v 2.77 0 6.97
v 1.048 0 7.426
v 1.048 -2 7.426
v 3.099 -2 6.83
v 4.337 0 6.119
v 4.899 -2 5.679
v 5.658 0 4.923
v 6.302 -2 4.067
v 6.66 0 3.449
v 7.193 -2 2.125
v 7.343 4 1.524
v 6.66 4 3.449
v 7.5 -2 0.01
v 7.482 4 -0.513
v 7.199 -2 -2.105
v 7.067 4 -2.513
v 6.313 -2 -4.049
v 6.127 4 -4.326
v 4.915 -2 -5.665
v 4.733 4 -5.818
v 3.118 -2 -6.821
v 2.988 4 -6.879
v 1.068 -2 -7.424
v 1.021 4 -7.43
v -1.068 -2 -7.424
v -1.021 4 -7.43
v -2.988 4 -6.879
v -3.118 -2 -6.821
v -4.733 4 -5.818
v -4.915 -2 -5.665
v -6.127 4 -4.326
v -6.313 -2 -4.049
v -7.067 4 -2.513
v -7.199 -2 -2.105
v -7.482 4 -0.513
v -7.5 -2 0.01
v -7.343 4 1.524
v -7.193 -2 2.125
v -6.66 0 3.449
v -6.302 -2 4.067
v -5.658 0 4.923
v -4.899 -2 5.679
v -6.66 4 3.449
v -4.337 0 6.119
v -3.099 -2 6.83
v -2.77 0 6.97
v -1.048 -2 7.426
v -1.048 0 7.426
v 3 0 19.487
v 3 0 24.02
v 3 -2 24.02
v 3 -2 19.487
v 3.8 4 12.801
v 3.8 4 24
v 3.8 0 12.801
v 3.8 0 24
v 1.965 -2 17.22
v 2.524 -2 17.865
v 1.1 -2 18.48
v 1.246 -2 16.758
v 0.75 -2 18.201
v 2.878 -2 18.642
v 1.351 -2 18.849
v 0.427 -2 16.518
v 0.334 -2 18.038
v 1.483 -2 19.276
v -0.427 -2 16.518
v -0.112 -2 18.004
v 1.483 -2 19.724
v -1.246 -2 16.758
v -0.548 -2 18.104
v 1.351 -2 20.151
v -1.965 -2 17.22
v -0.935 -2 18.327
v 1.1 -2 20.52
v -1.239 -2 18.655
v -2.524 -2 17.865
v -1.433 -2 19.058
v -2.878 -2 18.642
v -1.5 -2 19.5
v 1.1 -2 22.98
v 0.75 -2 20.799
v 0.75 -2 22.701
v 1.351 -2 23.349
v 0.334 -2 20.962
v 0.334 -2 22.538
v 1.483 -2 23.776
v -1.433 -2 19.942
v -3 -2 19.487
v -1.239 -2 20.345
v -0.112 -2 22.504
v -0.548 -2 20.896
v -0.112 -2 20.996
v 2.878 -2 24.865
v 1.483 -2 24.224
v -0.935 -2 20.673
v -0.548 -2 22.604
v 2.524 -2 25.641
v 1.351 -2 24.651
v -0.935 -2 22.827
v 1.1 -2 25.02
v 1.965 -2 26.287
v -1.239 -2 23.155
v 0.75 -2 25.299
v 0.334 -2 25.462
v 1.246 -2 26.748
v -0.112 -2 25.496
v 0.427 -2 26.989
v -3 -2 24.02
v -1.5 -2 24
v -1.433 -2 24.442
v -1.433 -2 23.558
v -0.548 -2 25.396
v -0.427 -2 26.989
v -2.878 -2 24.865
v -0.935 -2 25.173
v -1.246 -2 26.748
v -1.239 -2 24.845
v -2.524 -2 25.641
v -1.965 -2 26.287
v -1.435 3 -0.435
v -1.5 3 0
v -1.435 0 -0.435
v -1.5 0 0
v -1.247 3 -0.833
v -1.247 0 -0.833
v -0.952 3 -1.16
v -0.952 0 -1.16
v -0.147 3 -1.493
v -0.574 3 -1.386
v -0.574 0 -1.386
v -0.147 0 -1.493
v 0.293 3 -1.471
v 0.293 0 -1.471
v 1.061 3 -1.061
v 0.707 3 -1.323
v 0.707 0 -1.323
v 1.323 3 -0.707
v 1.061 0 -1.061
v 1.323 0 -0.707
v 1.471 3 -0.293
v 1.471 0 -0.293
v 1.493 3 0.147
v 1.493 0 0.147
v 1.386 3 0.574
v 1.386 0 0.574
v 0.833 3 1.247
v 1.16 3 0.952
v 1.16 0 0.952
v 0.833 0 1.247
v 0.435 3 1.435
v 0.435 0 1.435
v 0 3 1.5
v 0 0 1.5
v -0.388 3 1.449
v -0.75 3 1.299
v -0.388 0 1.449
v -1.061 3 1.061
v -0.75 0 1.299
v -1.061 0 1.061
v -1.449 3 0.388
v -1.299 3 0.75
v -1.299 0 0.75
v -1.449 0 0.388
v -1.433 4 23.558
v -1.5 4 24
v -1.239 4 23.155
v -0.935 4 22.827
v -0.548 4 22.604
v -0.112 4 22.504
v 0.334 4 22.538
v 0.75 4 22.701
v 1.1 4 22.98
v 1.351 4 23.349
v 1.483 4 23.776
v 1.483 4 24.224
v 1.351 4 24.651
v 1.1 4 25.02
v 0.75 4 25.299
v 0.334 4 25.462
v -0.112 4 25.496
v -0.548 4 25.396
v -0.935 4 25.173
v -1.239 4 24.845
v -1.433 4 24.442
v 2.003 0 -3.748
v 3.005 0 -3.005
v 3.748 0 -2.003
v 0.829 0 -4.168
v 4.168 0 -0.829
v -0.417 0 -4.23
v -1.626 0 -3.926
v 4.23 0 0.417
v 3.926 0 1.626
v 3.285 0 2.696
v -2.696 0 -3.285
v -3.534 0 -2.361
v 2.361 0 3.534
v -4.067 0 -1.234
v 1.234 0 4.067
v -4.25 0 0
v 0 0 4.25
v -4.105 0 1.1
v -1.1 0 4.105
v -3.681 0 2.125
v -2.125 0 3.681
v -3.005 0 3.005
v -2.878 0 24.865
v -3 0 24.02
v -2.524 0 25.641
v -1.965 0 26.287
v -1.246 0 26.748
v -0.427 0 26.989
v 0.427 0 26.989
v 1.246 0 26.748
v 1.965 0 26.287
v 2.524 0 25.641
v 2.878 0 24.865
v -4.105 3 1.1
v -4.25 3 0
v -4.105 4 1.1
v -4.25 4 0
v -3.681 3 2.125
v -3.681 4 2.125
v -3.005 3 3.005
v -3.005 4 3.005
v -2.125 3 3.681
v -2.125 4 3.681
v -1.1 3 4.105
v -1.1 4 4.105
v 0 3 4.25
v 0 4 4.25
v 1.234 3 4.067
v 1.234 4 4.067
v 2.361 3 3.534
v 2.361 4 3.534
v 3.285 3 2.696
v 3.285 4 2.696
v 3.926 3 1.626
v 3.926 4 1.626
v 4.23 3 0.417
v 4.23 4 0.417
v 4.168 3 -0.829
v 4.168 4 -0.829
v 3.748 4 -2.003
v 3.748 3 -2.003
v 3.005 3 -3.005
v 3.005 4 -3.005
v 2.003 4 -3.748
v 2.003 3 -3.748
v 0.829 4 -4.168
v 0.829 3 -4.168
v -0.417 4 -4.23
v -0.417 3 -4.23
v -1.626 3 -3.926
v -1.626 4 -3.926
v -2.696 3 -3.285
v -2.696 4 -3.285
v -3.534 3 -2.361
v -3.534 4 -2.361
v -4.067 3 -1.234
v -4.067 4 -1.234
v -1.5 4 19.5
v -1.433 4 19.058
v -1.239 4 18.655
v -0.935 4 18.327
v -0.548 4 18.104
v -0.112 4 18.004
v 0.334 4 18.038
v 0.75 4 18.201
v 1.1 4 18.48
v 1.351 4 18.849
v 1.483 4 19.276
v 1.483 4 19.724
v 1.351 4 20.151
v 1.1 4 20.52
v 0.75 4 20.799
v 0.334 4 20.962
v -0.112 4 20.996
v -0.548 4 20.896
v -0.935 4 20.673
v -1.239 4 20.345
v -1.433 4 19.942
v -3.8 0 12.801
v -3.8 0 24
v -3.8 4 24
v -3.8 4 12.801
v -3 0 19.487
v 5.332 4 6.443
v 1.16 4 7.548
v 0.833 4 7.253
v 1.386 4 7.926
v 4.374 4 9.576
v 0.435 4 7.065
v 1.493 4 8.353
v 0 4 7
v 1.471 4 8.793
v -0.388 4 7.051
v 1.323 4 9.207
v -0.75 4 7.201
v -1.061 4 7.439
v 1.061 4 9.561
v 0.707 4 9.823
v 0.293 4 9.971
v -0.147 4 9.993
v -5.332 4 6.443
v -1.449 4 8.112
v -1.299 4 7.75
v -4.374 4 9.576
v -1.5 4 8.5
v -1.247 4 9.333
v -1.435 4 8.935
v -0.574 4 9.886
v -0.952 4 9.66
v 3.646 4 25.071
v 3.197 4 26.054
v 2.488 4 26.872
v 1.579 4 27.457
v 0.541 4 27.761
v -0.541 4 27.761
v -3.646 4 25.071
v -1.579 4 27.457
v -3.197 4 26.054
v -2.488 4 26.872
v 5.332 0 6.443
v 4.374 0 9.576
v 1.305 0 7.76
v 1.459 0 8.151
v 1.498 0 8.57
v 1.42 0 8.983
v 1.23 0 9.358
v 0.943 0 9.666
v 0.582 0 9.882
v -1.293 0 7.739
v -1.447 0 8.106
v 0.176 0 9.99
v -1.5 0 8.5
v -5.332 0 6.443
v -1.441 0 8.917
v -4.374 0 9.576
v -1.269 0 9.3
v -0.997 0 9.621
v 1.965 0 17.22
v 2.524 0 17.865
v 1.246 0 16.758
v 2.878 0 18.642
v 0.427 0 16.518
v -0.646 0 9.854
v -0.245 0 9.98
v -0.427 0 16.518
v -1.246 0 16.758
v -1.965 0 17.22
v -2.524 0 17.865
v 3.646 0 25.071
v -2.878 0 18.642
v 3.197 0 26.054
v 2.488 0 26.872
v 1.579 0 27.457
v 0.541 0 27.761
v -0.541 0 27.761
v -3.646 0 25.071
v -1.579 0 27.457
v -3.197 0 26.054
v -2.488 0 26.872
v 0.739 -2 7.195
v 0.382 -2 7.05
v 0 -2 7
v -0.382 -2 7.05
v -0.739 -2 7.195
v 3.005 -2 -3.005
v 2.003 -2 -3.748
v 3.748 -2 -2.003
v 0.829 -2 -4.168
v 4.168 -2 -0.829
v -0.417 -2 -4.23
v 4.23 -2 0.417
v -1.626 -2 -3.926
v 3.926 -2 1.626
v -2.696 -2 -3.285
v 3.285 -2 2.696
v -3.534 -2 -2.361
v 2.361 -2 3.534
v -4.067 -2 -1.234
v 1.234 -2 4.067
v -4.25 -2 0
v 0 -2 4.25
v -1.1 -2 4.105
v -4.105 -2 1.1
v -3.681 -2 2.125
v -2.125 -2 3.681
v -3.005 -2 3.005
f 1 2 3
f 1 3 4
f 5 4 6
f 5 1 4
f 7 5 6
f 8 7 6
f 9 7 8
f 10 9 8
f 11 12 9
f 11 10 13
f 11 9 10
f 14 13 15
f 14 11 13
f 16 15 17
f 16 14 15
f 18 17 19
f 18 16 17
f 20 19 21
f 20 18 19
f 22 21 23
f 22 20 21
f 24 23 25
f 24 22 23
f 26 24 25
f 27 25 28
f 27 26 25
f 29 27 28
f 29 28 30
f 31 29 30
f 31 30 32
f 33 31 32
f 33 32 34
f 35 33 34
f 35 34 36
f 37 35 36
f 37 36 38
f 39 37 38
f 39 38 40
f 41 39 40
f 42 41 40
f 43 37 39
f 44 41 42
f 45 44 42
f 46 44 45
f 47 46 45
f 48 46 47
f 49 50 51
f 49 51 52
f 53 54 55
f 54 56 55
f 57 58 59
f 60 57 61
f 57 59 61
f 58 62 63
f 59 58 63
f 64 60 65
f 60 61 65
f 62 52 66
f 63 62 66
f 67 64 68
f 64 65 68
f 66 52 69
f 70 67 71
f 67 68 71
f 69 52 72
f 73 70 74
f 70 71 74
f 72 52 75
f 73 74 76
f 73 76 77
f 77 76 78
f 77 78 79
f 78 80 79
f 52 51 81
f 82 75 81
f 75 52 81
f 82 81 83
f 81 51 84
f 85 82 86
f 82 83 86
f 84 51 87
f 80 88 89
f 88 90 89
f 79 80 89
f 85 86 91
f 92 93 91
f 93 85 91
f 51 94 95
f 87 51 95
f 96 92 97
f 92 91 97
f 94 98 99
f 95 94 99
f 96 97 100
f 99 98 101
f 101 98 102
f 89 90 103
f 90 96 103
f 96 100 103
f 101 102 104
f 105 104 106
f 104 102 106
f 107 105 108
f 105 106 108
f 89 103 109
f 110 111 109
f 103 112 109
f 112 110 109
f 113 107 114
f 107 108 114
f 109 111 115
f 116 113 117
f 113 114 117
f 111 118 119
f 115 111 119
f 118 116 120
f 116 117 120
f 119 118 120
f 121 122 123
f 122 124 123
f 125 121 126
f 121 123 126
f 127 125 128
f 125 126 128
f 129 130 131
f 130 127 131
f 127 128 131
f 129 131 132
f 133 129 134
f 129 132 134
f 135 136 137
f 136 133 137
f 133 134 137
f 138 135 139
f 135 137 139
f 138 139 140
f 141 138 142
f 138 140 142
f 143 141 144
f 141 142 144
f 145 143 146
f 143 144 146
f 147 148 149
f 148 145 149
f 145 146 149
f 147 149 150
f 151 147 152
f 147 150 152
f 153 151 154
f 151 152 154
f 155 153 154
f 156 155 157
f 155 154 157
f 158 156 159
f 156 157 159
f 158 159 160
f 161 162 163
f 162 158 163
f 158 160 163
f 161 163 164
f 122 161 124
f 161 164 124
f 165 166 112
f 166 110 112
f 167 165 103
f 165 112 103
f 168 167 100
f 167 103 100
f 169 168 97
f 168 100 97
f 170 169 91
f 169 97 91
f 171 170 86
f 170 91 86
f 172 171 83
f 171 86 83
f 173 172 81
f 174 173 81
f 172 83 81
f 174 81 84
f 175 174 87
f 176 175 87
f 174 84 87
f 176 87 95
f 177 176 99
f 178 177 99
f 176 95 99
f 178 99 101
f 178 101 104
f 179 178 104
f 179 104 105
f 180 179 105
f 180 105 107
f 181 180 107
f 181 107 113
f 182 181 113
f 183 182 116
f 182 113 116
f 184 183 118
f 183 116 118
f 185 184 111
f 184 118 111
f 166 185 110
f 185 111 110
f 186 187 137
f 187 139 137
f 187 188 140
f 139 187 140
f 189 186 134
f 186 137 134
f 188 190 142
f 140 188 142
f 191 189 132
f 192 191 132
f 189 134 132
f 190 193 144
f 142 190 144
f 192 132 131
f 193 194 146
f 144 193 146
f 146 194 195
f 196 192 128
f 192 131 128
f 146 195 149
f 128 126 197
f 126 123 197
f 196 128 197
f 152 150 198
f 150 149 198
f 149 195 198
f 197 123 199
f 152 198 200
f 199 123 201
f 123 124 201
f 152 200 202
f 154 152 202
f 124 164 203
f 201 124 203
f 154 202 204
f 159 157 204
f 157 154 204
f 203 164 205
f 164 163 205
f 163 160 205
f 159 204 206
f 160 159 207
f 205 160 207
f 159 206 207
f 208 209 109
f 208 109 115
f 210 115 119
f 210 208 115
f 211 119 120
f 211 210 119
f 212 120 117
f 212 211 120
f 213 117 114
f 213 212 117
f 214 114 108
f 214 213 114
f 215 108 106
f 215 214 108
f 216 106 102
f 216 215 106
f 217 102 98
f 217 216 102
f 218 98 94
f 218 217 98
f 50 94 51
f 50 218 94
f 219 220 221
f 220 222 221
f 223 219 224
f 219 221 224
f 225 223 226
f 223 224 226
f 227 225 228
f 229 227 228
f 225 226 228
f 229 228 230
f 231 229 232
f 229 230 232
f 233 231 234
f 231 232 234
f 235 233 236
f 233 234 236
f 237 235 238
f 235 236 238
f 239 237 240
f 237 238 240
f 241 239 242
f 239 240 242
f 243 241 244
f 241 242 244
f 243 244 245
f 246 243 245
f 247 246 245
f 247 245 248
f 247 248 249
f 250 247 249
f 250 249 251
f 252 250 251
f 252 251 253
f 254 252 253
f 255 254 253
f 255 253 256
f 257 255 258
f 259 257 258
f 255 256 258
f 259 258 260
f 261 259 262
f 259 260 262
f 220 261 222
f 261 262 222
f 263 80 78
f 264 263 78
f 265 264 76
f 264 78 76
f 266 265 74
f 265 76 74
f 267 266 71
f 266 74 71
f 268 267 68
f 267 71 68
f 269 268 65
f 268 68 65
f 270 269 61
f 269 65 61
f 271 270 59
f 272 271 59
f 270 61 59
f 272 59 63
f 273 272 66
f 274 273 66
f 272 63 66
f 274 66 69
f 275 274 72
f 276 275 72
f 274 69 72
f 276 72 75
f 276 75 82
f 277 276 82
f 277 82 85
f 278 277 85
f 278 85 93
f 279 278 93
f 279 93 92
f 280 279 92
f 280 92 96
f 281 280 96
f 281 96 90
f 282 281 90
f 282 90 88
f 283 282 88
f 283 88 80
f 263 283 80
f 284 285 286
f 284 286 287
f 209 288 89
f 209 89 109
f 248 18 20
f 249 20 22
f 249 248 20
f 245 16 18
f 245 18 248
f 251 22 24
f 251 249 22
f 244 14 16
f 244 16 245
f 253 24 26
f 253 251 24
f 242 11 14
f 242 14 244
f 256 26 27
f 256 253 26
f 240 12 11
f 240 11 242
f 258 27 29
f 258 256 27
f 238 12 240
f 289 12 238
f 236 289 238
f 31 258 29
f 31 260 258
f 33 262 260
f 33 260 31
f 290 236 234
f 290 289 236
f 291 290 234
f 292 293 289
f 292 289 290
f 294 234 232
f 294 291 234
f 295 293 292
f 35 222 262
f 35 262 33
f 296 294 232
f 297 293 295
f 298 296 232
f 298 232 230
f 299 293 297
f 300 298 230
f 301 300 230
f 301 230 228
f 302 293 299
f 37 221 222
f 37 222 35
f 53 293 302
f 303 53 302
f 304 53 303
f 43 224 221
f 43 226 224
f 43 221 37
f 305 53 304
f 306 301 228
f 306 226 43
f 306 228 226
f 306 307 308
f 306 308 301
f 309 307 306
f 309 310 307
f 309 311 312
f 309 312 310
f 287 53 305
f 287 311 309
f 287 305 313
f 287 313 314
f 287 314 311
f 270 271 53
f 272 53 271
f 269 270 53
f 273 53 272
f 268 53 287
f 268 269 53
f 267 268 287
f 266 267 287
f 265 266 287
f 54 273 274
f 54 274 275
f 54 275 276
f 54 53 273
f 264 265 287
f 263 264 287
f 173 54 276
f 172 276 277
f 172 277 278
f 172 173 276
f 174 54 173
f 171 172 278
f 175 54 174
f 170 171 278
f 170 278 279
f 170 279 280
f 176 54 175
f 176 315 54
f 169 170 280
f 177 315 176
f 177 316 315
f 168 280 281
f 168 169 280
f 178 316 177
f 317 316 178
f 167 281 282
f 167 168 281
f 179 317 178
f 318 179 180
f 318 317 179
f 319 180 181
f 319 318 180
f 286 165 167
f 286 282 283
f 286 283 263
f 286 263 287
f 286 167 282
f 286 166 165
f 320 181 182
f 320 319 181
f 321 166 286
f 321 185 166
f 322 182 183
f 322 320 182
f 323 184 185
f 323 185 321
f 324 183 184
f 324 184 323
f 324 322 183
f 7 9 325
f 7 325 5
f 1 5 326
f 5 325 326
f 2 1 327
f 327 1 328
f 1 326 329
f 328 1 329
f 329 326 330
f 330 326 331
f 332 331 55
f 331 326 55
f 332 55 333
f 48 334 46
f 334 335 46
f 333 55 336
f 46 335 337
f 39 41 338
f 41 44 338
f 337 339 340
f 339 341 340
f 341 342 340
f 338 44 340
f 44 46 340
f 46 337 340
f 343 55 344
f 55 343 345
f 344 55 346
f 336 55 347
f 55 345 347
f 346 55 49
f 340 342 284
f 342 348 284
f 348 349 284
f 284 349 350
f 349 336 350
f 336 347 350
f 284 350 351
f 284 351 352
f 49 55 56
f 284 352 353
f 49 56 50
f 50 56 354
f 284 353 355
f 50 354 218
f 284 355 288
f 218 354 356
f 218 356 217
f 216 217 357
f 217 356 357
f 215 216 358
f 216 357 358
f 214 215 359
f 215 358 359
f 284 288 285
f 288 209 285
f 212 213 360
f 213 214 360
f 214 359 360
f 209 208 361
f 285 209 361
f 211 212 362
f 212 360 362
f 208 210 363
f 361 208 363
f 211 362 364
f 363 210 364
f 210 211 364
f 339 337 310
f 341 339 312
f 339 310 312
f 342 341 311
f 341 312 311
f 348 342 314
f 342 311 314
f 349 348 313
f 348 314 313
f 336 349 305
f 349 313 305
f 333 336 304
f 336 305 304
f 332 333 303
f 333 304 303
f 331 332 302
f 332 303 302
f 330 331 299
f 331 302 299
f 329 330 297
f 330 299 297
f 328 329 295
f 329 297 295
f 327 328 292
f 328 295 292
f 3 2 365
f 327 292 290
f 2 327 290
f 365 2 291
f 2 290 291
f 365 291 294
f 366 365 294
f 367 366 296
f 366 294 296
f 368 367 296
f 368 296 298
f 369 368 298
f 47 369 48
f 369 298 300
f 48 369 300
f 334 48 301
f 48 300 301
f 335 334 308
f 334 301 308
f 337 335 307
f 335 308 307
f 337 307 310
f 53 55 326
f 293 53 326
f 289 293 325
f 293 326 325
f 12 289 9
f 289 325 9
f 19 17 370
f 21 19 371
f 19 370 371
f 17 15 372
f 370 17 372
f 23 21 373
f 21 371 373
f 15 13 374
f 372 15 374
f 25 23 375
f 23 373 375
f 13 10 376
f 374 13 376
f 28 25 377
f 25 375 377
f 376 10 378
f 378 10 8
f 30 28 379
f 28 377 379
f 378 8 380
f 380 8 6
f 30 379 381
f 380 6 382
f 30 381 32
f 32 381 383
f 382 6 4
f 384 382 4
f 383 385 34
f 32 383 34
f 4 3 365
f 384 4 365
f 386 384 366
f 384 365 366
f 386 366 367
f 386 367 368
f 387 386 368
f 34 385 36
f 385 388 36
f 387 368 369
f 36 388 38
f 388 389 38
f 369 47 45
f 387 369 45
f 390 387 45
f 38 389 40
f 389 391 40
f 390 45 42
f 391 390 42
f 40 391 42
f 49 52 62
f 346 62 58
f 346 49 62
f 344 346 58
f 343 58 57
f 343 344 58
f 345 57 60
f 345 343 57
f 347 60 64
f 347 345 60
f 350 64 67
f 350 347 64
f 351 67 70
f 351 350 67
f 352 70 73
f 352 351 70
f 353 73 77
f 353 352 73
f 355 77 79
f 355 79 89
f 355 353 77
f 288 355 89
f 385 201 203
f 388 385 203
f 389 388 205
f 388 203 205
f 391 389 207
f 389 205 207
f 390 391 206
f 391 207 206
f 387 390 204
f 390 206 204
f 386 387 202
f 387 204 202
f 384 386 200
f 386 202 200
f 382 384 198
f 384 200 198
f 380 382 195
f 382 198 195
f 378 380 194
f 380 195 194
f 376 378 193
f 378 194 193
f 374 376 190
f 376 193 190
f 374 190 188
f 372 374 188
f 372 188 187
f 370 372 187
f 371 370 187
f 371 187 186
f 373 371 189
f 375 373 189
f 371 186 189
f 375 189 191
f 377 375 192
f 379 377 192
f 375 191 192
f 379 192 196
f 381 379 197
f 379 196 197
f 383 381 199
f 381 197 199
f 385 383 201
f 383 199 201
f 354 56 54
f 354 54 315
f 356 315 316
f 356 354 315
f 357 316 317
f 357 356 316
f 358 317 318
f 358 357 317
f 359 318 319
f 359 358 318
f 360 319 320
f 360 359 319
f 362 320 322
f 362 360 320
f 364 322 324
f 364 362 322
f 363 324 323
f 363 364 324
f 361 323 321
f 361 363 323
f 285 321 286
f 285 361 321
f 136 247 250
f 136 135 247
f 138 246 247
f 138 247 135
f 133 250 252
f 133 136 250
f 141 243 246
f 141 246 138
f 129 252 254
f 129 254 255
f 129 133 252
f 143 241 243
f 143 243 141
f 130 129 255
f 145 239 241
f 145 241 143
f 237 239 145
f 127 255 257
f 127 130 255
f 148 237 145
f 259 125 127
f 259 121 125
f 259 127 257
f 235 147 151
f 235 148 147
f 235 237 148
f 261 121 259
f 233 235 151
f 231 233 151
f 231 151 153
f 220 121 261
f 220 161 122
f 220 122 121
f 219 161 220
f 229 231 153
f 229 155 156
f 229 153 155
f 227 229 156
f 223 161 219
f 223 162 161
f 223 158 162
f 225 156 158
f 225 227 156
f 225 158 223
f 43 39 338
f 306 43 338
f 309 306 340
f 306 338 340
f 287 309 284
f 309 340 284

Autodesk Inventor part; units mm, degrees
ref_plane "YZ Plane" through (0, 0, 0) normal (1, 0, 0) x (0, 1, 0)
ref_plane "XZ Plane" through (0, 0, 0) normal (0, 1, 0) x (-1, 0, 0)
ref_plane "XY Plane" through (0, 0, 0) normal (0, 0, 1) x (1, 0, 0)
sketch "スケッチ1" plane through (0, 0, 0) normal (0, 1, 0) x (-1, 0, 0)
  circle A0 centre (0, 0) radius 7.5
  circle A1 centre (0, 0) radius 4.25
  circle A2 centre (0, 0) radius 1.5
  line L0 (0, 0) -> (0, 24)
  circle A3 centre (0, 24) radius 3.8
  line L1 (3.8, 24) -> (3.8, 12.8013)
  line L2 (-3.8, 24) -> (-3.8, 12.8013)
  circle A4 centre (0, 24) radius 1.5
  circle A5 centre (0, 19.5) radius 1.5
  circle A6 centre (0, 8.5) radius 1.5
  arc A7 (3.8, 12.8013) -> (6.6601, 3.4487) centre (30.7804, 15.9384) ccw
  arc A8 (-6.6601, 3.4487) -> (-3.8, 12.8013) centre (-30.7804, 15.9384) ccw
  line L3 (-3, 19.487) -> (3, 19.487)
  line L4 (3, 19.487) -> (3, 24.0195)
  line L5 (3, 24.0195) -> (-3, 24.0195)
  line L6 (-3, 24.0195) -> (-3, 19.487)
  circle A9 centre (0, 19.487) radius 3
  circle A10 centre (0, 24.0195) radius 3
  point P0 (3.8, 8)
  point P1 (-3.8, 8)
  point P2 (-6.6601, 3.4487)
  point P3 (3.8, 24)
  point P4 (-1.0476, 7.4265)
  point P5 (1.0476, 7.4265)
  dimension "d0" = 15
  dimension "d1" = 8.5
  dimension "d2" = 3
  dimension "d3" = 24
  dimension "d4" = 7.6
  dimension "d5" = 16
  dimension "d6" = 0
  dimension "d7" = 3
  dimension "d8" = 3
  dimension "d9" = 4.5
  dimension "d10" = 3
  dimension "d11" = 11
  dimension "d14" = 3
  dimension "d15" = 3
extrude "押し出し1" add sketch "スケッチ1" along normal blind 4 contours A0 A6 | A0 A6 L0 A9 L4 A3 L1 A7 | A8 L2 A3 L6 A9 L0 A6 A0 | A3 L4 A10 L6 | L4 A9 A3 | A3 A9 A10 L4 | A9 L3 A5 L0 | L0 A5 L3 A9 | L6 A10 A9 A3 | A3 A9 L6 | A9 L3 A5 A3 | A3 A5 L0 A10 A9 | A10 A9 L0 A4 L5 | L5 A4 A10 | A9 A3 A5 L3 | A9 A10 L0 A5 A3 | L5 A4 L0 A9 A10 | A10 L0 A9 | A9 L0 A10
extrude "押し出し2" add sketch "スケッチ1" against normal blind 2 contours L4 A9 A3 | A3 A9 A10 L4 | A9 L3 A5 L0 | L0 A5 L3 A9 | L6 A10 A9 A3 | A3 A9 L6 | A9 L3 A5 A3 | A3 A5 L0 A10 A9 | A10 A9 L0 A4 L5 | L5 A4 A10 | A9 A3 A5 L3 | A9 A10 L0 A5 A3 | L5 A4 L0 A9 A10 | A10 L0 A9 | A9 L0 A10
extrude "押し出し3" add sketch "スケッチ1" against normal blind 2 contours A0 A6
extrude "押し出し4" add sketch "スケッチ1" along normal blind 3 contours A1
properties part number "ServoMotor_Hone2" material "鋼、高強度、低合金"
